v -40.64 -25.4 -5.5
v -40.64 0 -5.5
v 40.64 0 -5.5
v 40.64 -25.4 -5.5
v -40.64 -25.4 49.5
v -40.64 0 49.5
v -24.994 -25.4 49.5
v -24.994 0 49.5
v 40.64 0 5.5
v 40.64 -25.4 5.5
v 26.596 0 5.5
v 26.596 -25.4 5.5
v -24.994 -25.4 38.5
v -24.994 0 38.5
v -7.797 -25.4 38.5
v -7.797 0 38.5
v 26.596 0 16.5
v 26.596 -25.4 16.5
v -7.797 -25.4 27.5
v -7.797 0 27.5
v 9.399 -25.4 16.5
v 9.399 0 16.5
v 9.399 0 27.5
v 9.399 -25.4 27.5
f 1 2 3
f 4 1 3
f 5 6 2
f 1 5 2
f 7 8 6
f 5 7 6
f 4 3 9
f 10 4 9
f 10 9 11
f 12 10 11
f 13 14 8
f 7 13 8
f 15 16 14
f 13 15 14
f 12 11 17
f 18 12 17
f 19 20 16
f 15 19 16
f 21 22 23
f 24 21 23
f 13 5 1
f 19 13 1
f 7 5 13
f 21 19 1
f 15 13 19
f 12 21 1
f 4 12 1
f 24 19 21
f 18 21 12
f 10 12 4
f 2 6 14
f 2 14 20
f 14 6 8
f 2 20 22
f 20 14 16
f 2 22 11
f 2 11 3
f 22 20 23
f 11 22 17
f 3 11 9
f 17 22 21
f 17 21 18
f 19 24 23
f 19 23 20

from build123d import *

# Parameters (mm, degrees)
F0_W     = 17.197048
F0_H     = 11
F1_DEPTH = 25.4


with BuildPart() as f1:
    # F0 (on Front) → F1 (new body)
    with BuildSketch(Plane.XZ):
        Polygon((-40.64, -5.5), (40.64, -5.5), (40.64, 5.5), (26.59588, 5.5), (9.398832, 5.5), (-7.796968, 5.5), (-24.994018, 5.5), (-40.64, 5.5), align=None)
        Polygon((-40.64, 49.5), (-40.64, 5.5), (-24.994018, 5.5), (-24.994018, 38.5), (-24.994018, 49.5), align=None)
        with Locations((17.997356, 11)):
            Rectangle(F0_W, F0_H)
        Polygon((-24.994018, 38.5), (-24.994018, 5.5), (-7.796968, 5.5), (-7.796968, 27.5), (-7.796968, 38.5), align=None)
        Polygon((-7.796968, 5.5), (9.398832, 5.5), (9.398832, 16.5), (9.398832, 27.5), (-7.796968, 27.5), align=None)
    extrude(amount=F1_DEPTH)


solid = f1.part
